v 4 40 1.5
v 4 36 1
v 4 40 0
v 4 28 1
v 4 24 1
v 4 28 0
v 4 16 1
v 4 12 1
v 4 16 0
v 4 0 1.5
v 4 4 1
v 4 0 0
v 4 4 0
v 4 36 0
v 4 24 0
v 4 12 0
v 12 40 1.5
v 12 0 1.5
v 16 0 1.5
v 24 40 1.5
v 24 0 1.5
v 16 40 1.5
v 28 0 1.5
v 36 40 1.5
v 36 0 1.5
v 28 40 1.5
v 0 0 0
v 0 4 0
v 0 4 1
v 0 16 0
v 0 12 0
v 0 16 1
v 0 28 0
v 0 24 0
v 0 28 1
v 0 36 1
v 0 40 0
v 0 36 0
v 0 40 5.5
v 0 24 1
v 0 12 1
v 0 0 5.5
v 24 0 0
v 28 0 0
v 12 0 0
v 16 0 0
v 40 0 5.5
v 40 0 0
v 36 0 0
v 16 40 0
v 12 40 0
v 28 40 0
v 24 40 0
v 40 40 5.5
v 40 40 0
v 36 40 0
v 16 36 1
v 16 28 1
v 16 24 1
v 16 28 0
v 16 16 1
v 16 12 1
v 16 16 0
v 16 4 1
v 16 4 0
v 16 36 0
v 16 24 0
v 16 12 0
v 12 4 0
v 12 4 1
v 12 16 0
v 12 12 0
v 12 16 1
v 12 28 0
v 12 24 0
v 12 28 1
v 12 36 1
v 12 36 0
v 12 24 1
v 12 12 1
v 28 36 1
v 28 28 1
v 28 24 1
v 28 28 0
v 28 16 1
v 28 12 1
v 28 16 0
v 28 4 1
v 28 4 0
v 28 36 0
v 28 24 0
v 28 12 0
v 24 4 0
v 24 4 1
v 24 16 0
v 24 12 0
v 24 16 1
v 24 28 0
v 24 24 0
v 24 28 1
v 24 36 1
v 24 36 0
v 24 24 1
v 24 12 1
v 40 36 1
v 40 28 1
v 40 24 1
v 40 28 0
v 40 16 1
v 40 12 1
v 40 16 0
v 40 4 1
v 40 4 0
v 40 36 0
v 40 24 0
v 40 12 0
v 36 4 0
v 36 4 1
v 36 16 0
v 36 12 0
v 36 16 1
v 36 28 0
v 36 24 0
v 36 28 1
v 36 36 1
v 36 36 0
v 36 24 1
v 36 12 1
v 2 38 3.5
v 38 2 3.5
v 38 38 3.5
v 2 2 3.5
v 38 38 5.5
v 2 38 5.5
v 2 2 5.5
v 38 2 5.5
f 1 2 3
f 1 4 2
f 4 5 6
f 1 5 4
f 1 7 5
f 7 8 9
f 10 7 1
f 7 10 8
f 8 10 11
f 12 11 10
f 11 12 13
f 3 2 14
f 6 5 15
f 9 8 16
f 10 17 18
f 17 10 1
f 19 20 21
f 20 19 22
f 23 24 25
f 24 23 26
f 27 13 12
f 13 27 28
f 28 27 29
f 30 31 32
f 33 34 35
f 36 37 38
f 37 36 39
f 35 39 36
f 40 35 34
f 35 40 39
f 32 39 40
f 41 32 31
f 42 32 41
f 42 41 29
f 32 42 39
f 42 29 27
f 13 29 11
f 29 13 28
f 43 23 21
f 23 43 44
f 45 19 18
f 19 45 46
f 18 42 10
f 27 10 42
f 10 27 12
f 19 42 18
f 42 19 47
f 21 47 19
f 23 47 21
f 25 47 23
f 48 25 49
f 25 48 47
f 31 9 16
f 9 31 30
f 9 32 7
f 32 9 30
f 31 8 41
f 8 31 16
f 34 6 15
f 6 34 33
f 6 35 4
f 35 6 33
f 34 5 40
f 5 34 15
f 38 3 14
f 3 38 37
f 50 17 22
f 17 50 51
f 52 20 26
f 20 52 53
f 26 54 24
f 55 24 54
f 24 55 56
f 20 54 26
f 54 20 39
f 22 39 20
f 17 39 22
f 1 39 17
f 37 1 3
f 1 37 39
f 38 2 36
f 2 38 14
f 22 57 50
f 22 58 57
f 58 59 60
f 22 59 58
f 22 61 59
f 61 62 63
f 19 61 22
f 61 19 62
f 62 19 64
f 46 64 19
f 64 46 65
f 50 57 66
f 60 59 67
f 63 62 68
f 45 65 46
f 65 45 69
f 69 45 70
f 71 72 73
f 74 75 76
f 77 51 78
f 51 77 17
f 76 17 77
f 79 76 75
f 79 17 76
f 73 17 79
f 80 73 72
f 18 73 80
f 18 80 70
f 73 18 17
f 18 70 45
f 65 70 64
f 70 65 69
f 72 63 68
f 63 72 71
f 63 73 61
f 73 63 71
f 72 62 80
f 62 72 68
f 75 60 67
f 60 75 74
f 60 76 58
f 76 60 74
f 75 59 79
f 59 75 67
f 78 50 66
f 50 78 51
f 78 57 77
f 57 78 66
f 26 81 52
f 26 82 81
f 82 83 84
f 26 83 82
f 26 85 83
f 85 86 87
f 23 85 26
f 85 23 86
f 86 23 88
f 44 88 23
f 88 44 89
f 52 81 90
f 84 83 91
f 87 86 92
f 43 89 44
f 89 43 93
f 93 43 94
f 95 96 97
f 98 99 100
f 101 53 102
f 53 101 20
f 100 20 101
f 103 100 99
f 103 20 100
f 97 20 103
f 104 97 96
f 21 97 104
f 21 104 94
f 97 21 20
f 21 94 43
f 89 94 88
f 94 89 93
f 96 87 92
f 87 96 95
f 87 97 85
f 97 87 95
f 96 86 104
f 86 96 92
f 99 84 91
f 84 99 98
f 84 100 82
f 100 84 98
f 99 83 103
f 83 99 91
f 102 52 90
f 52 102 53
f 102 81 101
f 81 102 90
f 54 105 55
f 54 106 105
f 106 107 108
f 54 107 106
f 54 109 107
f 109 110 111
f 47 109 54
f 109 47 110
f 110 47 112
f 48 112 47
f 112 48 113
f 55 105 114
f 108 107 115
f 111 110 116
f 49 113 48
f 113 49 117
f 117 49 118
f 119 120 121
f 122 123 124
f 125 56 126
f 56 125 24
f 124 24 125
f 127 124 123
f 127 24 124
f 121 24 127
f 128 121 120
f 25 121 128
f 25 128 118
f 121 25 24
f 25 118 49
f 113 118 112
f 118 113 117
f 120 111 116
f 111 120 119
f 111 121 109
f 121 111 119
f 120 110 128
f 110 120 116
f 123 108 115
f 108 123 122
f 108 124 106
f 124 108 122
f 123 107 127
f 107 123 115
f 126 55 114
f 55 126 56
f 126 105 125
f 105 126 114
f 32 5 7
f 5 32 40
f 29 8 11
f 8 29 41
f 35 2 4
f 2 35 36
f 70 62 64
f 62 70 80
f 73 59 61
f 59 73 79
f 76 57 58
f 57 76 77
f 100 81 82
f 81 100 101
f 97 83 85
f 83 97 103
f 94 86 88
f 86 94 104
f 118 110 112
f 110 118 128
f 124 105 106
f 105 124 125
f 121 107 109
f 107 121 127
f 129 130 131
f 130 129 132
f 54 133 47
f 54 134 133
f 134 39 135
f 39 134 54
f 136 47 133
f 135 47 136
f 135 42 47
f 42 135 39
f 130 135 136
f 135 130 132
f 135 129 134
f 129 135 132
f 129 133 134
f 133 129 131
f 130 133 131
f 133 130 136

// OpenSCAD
union() {
	translate(v = [0, 0, 0]) {
		cube(size = [4, 4, 1.5000000000]);
	}
	translate(v = [0, 12, 0]) {
		cube(size = [4, 4, 1.5000000000]);
	}
	translate(v = [0, 24, 0]) {
		cube(size = [4, 4, 1.5000000000]);
	}
	translate(v = [0, 36, 0]) {
		cube(size = [4, 4, 1.5000000000]);
	}
	translate(v = [12, 0, 0]) {
		cube(size = [4, 4, 1.5000000000]);
	}
	translate(v = [12, 12, 0]) {
		cube(size = [4, 4, 1.5000000000]);
	}
	translate(v = [12, 24, 0]) {
		cube(size = [4, 4, 1.5000000000]);
	}
	translate(v = [12, 36, 0]) {
		cube(size = [4, 4, 1.5000000000]);
	}
	translate(v = [24, 0, 0]) {
		cube(size = [4, 4, 1.5000000000]);
	}
	translate(v = [24, 12, 0]) {
		cube(size = [4, 4, 1.5000000000]);
	}
	translate(v = [24, 24, 0]) {
		cube(size = [4, 4, 1.5000000000]);
	}
	translate(v = [24, 36, 0]) {
		cube(size = [4, 4, 1.5000000000]);
	}
	translate(v = [36, 0, 0]) {
		cube(size = [4, 4, 1.5000000000]);
	}
	translate(v = [36, 12, 0]) {
		cube(size = [4, 4, 1.5000000000]);
	}
	translate(v = [36, 24, 0]) {
		cube(size = [4, 4, 1.5000000000]);
	}
	translate(v = [36, 36, 0]) {
		cube(size = [4, 4, 1.5000000000]);
	}
	translate(v = [0, 0, 1.0000000000]) {
		cube(size = [4, 40, 0.5000000000]);
	}
	translate(v = [12, 0, 1.0000000000]) {
		cube(size = [4, 40, 0.5000000000]);
	}
	translate(v = [24, 0, 1.0000000000]) {
		cube(size = [4, 40, 0.5000000000]);
	}
	translate(v = [36, 0, 1.0000000000]) {
		cube(size = [4, 40, 0.5000000000]);
	}
	translate(v = [0, 0, 1.5000000000]) {
		cube(size = [40, 40, 2]);
	}
	translate(v = [0, 0, 3.5000000000]) {
		cube(size = [40, 2, 2]);
	}
	translate(v = [0, 0, 3.5000000000]) {
		cube(size = [2, 40, 2]);
	}
	translate(v = [0, 38, 3.5000000000]) {
		cube(size = [40, 2, 2]);
	}
	translate(v = [38, 0, 3.5000000000]) {
		cube(size = [2, 40, 2]);
	}
	translate(v = [4, 4, 3.4900000000]) {
		scale(v = [0.6100000000, 0.6100000000, 1]) {
			dxf_linear_extrude(height = 2, file = "0131.dxf");
		}
	}
}
